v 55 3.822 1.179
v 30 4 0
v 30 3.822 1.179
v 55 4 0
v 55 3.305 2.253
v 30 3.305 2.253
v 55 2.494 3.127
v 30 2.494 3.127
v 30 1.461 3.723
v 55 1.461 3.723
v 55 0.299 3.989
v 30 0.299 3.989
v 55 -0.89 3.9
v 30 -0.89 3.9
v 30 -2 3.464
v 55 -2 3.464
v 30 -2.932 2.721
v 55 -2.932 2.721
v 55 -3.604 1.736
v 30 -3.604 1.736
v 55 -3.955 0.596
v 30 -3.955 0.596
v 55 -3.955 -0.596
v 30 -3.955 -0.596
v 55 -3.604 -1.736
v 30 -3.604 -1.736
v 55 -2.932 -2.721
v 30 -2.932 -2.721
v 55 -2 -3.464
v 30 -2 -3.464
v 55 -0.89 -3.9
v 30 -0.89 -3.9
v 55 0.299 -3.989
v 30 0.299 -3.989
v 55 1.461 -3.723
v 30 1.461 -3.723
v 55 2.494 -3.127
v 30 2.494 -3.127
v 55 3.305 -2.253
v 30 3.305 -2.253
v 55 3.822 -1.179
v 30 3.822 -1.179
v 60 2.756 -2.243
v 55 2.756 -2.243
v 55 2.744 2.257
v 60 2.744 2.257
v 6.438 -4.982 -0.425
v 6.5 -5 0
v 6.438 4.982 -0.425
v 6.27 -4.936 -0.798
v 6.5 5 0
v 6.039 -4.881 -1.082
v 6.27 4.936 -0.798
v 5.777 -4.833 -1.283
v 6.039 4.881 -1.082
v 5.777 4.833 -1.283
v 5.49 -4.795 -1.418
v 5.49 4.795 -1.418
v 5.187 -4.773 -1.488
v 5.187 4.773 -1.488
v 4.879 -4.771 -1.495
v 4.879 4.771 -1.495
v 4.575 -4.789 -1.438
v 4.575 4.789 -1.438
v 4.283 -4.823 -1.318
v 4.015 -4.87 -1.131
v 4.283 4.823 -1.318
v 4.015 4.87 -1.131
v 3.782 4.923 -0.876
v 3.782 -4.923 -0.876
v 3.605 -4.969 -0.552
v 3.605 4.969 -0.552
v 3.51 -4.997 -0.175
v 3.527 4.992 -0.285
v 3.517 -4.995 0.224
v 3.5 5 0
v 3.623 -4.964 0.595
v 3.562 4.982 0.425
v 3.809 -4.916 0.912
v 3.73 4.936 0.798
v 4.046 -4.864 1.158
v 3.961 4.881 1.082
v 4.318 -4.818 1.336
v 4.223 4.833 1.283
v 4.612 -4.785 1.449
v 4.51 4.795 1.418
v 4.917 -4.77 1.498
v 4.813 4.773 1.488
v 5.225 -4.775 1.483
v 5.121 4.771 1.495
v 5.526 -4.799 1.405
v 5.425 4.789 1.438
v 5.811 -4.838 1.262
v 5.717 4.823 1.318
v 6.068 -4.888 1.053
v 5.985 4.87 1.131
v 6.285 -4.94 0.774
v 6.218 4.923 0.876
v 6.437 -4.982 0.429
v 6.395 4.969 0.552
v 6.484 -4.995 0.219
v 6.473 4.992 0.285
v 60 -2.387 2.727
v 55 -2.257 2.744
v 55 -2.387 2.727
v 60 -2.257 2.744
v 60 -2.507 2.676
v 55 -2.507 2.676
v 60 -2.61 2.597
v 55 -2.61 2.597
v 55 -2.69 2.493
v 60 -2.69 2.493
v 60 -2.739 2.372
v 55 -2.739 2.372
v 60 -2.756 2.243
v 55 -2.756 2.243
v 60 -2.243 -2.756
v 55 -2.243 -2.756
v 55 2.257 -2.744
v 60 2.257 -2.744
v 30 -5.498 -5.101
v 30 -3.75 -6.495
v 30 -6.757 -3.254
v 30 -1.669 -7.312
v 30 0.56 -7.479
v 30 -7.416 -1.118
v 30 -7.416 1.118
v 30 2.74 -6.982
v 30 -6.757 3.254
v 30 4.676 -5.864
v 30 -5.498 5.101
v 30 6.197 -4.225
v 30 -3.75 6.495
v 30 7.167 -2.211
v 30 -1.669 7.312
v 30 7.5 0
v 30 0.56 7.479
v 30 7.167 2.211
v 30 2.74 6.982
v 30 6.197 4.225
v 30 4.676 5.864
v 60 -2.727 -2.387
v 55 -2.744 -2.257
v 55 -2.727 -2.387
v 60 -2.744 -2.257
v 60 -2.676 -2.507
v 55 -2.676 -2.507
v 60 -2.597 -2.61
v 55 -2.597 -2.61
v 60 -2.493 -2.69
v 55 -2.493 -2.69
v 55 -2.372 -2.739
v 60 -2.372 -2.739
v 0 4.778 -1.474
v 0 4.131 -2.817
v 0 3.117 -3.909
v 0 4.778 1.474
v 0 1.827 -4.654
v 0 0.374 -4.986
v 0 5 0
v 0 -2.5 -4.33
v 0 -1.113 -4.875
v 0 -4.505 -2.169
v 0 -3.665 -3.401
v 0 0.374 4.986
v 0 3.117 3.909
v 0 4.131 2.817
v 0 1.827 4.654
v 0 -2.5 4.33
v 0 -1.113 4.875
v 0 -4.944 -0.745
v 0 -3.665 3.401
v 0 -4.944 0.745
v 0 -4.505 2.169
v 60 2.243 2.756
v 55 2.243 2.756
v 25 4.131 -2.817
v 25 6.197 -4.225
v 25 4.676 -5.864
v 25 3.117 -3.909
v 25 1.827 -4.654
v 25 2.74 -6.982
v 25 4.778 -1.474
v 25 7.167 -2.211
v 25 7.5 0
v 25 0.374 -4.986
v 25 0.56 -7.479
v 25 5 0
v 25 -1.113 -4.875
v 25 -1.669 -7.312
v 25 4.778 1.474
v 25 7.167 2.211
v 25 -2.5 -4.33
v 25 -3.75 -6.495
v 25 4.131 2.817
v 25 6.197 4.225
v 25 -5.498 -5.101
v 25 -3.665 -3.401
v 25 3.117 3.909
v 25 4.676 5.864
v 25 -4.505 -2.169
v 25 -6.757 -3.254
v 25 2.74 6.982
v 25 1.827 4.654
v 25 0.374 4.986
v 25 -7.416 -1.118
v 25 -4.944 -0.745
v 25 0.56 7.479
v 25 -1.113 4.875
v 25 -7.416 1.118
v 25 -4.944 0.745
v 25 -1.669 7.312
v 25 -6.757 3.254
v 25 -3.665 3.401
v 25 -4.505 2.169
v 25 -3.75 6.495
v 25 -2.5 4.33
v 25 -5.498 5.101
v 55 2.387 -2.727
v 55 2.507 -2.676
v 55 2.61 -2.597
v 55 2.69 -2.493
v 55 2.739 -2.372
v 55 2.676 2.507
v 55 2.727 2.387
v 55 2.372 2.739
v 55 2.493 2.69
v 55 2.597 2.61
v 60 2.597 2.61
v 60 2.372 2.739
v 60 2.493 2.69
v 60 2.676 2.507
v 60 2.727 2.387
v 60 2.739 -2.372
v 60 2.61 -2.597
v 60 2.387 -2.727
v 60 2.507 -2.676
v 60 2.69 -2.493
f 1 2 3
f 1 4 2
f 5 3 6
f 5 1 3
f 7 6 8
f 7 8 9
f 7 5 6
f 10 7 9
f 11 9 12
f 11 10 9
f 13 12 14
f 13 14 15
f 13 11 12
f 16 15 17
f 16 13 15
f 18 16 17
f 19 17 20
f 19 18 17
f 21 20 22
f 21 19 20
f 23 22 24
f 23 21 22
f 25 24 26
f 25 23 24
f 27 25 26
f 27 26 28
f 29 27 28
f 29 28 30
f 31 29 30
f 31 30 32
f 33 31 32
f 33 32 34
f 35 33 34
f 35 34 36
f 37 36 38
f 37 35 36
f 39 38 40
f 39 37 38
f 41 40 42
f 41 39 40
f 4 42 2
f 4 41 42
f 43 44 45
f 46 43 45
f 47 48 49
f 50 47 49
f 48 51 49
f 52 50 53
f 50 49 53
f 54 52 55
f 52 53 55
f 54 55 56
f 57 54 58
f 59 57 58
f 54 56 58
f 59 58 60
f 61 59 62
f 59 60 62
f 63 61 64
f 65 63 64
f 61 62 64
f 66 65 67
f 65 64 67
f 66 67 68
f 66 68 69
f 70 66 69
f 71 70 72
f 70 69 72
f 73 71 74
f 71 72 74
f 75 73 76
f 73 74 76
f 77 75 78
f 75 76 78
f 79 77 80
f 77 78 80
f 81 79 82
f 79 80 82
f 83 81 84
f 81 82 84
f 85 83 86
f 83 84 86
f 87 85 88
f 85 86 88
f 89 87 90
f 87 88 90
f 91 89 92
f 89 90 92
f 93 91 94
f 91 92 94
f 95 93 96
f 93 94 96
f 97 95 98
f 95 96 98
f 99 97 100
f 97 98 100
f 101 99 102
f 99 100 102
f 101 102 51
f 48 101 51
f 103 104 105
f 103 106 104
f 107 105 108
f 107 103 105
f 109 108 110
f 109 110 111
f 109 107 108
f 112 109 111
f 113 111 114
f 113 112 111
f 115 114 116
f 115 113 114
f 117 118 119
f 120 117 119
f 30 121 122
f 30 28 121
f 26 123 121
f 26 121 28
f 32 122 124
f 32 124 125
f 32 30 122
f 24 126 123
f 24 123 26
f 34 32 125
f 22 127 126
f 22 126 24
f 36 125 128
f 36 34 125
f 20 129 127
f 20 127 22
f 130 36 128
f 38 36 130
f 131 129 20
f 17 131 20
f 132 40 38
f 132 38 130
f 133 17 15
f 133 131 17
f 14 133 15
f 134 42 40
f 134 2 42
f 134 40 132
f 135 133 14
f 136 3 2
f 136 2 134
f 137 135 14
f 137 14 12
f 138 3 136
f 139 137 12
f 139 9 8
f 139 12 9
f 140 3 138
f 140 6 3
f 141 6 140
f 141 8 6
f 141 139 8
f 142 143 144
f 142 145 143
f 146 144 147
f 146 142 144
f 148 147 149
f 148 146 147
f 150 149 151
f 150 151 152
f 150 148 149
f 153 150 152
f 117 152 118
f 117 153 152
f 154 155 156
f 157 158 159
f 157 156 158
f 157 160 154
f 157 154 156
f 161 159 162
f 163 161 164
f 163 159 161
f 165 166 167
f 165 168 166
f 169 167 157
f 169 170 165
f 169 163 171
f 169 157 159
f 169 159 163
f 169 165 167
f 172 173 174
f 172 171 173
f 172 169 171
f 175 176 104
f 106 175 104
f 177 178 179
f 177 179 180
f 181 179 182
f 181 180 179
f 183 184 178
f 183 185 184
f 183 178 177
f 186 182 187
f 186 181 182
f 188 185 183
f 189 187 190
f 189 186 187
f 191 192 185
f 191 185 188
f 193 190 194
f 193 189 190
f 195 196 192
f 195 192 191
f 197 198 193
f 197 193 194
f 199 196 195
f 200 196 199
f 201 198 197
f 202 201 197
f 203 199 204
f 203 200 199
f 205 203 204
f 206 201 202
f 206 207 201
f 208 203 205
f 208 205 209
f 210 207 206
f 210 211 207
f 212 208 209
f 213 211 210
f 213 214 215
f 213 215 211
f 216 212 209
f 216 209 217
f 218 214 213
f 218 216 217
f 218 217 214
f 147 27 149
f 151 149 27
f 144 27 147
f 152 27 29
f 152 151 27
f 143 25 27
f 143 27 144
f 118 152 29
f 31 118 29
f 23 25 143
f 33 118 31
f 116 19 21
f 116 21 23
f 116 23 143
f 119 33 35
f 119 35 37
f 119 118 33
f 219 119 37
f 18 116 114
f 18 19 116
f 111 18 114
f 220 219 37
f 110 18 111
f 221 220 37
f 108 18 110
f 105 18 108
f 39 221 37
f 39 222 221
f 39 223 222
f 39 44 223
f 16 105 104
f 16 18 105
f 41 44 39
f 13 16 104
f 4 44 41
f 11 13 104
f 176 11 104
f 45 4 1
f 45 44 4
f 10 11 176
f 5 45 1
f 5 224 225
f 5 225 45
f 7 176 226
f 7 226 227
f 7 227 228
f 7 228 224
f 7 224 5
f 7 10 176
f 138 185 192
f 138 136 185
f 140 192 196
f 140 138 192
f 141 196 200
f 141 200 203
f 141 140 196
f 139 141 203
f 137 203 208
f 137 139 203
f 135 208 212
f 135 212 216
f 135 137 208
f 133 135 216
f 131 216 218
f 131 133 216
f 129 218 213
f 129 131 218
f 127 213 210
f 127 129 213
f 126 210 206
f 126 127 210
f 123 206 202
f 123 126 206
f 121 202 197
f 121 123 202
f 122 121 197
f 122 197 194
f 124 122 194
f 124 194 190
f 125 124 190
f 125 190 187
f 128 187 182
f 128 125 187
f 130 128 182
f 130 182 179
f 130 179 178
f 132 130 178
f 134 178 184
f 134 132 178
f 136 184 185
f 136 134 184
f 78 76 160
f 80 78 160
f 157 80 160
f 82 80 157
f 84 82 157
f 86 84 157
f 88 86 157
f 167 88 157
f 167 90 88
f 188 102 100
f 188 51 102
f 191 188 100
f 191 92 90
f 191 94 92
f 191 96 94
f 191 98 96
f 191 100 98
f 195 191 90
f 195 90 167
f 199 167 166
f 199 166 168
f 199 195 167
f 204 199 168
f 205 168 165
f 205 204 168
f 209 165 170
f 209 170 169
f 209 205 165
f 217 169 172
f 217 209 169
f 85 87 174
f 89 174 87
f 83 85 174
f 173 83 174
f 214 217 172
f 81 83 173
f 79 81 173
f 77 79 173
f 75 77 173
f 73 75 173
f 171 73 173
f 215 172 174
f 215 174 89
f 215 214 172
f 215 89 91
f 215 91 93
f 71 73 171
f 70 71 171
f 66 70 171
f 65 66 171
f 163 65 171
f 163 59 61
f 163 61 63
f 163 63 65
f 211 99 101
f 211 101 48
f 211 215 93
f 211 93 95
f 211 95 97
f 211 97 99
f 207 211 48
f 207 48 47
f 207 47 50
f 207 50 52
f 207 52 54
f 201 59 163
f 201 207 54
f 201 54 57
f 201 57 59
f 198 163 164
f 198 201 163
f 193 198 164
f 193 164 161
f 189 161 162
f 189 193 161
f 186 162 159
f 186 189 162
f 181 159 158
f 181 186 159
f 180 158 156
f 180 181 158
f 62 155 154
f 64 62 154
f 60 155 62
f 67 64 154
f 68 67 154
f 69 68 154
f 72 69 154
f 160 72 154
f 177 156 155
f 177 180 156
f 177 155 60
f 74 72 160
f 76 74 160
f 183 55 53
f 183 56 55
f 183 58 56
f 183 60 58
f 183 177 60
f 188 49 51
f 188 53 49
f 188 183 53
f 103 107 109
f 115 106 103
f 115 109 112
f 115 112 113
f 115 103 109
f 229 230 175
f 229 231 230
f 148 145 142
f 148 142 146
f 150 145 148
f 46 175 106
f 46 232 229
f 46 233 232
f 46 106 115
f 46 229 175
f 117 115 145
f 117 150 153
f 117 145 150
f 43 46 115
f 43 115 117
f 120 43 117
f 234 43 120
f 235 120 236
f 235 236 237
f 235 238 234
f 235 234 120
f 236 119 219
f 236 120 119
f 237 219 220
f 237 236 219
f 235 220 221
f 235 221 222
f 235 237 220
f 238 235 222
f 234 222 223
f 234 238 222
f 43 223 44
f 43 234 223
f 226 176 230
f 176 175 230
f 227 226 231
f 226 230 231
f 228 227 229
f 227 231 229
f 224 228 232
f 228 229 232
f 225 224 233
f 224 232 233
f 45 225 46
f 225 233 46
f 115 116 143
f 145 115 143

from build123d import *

# Parameters (mm, degrees)
SKETCH_2_R          = 1.5
CUT_EXTRUDE_1_DEPTH = 5
EXTRUDE_1_DEPTH     = 5
FILLET_1_R          = 0.5


with BuildPart() as part:
    # 草图1 → 旋转1 (revolve)
    with BuildSketch(Plane.XY):
        Polygon((0, 0), (0, 5), (25, 5), (25, 7.5), (30, 7.5), (30, 4), (55, 4), (55, 0), align=None)
    revolve(axis=Axis((0, 0, 0), (1, 0, 0)))

    # 草图2 → 切除-拉伸1 (cut, symmetric)
    with BuildSketch(Plane(origin=(0, 0, 0), x_dir=(1, 0, 0), z_dir=(0, 1, 0))):
        with Locations((5, 0)):
            Circle(SKETCH_2_R)
    extrude(amount=CUT_EXTRUDE_1_DEPTH, both=True, mode=Mode.SUBTRACT)

    # 草图3 → 凸台-拉伸1 (add)
    with BuildSketch(Plane(origin=(55, 0, 0), x_dir=(0, 0, -1), z_dir=(1, 0, 0))):
        Polygon((-2.757308573, 2.742691427), (-2.742691427, -2.757308573), (2.757308573, -2.742691427), (2.742691427, 2.757308573), align=None)
    extrude(amount=EXTRUDE_1_DEPTH)

    # 圆角1
    fillet_1_edges = [part.edges().sort_by_distance(p)[0] for p in [
        (57.5, 2.757308573, -2.742691427),
        (57.5, 2.742691427, 2.757308573),
        (57.5, -2.757308573, 2.742691427),
        (57.5, -2.742691427, -2.757308573),
    ]]
    fillet(fillet_1_edges, radius=FILLET_1_R)


solid = part.part
